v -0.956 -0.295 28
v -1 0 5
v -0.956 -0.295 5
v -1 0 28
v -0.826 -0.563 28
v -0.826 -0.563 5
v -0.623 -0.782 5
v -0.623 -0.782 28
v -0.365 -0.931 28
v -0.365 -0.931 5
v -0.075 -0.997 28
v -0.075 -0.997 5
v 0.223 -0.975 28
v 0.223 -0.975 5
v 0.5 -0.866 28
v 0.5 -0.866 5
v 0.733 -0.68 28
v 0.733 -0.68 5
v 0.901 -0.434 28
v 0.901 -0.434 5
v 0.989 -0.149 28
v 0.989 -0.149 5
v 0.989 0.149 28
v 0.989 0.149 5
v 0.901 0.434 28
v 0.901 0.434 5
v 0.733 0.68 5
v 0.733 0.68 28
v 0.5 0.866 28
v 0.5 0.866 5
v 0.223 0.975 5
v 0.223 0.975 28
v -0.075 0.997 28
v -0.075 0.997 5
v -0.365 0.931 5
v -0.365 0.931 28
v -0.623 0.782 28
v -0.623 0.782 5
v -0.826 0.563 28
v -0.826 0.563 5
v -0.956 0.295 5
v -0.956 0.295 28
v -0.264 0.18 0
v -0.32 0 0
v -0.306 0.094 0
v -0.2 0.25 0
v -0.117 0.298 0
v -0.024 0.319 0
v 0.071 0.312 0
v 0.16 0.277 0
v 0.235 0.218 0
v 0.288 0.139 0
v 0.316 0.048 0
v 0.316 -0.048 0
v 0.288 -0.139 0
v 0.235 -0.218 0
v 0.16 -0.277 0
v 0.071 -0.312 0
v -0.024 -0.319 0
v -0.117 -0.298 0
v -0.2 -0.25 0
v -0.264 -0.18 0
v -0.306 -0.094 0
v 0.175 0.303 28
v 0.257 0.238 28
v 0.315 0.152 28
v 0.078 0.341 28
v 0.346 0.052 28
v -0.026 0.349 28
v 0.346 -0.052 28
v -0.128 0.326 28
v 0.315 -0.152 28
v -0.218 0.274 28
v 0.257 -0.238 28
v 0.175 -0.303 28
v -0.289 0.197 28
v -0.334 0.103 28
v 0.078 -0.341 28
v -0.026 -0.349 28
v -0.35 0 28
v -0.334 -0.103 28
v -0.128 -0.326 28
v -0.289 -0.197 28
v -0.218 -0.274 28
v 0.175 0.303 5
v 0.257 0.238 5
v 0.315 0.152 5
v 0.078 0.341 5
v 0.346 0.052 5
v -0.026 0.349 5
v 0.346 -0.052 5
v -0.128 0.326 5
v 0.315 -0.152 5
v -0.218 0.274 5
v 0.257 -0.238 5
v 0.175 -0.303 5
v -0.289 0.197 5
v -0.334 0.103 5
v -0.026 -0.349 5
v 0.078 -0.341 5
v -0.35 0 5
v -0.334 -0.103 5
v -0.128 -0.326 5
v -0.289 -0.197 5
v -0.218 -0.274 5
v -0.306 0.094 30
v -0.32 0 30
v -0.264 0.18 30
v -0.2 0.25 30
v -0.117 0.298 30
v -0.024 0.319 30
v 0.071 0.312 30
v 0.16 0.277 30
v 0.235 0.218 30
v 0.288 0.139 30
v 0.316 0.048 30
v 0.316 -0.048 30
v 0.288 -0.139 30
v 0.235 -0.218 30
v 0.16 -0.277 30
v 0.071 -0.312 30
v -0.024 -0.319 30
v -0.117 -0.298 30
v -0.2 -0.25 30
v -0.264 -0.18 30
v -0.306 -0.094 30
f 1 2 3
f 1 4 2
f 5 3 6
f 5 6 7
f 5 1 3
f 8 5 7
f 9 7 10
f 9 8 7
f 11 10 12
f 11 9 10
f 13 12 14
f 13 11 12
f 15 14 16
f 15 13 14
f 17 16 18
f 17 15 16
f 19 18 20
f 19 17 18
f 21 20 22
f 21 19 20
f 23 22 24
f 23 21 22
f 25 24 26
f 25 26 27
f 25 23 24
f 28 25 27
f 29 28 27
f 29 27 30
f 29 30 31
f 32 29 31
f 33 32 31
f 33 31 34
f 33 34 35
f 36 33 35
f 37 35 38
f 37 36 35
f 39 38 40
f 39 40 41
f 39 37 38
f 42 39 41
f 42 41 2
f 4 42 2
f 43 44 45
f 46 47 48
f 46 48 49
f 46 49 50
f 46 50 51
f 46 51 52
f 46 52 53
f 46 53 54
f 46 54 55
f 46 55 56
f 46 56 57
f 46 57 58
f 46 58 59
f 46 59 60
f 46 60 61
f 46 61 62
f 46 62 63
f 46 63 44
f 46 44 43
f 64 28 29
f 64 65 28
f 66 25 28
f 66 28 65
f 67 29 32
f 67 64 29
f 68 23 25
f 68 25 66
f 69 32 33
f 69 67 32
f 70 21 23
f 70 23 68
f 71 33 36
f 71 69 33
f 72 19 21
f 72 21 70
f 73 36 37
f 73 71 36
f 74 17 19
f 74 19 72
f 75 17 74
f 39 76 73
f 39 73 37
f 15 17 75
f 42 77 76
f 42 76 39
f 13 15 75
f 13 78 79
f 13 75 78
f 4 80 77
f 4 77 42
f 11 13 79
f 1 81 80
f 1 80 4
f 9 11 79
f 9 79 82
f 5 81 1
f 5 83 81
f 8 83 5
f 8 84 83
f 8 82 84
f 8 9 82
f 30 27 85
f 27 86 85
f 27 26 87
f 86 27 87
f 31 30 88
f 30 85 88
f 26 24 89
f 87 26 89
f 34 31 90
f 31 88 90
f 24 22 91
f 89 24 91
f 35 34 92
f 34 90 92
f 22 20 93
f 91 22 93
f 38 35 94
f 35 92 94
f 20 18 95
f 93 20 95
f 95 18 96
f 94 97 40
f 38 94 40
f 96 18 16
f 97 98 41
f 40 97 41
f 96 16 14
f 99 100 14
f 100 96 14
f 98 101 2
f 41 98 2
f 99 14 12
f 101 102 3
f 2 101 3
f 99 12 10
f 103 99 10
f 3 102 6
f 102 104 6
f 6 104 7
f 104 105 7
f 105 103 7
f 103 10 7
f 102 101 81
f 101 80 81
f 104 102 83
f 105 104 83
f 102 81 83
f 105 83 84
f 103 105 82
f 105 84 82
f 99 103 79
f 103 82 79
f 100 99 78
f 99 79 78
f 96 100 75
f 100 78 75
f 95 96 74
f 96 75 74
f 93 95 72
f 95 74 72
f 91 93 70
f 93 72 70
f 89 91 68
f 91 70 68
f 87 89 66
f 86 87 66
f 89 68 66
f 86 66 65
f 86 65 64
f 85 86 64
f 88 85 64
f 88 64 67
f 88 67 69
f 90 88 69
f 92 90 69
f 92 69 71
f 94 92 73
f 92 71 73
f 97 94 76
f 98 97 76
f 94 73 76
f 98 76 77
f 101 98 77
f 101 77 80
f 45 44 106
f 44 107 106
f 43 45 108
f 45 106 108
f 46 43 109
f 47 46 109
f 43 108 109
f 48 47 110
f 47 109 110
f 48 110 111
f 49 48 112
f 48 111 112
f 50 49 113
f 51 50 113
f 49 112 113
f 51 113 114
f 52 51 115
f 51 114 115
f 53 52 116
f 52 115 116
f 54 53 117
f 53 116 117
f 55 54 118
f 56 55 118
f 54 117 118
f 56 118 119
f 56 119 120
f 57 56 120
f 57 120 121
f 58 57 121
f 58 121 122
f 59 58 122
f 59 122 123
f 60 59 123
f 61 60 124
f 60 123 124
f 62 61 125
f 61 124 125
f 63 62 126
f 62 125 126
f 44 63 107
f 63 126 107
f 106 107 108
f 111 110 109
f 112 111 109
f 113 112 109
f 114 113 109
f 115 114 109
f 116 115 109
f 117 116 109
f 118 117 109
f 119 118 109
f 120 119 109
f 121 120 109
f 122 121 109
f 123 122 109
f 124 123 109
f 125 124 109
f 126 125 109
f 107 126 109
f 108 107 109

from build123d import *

# Parameters (mm, degrees)
F0_W = 0.32
F0_H = 30
F2_W = 0.65
F2_H = 23


with BuildPart() as f1:
    # F0 (on Front) → F1 (revolve)
    with BuildSketch(Plane.XZ):
        with Locations((-0.16, 15)):
            Rectangle(F0_W, F0_H)
    revolve(axis=Axis((0, 0, 15), (0, 0, -1)))


with BuildPart() as f3:
    # F2 (on Front) → F3 (revolve)
    with BuildSketch(Plane.XZ):
        with Locations((-0.675, 16.5)):
            Rectangle(F2_W, F2_H)
    revolve(axis=Axis((0, 0, 18.896753), (0, 0, 1)))


solid = Compound([f1.part, f3.part])
